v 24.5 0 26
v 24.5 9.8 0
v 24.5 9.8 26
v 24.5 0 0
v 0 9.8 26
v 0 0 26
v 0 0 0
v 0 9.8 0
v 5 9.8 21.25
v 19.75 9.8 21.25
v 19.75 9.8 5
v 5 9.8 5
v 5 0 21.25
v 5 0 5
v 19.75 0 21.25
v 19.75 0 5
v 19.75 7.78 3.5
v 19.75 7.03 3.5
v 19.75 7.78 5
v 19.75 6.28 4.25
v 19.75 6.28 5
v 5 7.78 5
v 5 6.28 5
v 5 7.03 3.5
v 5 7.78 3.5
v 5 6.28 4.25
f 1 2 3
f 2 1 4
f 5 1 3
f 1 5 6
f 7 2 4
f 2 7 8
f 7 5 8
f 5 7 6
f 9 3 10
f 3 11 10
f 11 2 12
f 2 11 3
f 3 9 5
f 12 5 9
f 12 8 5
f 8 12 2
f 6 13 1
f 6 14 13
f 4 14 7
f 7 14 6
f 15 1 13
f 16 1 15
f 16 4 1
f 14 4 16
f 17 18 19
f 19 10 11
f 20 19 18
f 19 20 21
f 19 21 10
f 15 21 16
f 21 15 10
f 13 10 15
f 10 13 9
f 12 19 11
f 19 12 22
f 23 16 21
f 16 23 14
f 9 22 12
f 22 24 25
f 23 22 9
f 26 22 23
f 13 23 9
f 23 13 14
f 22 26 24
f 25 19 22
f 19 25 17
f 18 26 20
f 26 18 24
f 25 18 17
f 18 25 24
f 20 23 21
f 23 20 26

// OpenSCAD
// all dimensions are in millimeters

// major dimension for keystone hole, width
keystone_width = 14.5;
// major dimension for keystone hole, height
keystone_height = 16;

// clearance around hole
boss_clearance = 0.25;
// margin aroudn keystone hole
boss_margin = 5;
boss_inner_width = keystone_width + boss_clearance;
boss_inner_height = keystone_height + boss_clearance;
boss_outer_width = keystone_width + boss_margin * 2;
boss_outer_height = keystone_height + boss_margin * 2;
// depth of the solid frame around the keystone hole
boss_depth = 9.8;

// major dimension of fixed tab as viewed from side of connector (square with a corner cut off)
fixed_tab_size = 1.5;
fixed_tab_depth_from_panel_face = 6.28;

module boss() {
    module basic_frame() {
        color([1, 1, 1])
            difference() {
                cube([boss_outer_width, boss_depth, boss_outer_height]);
                translate([boss_margin, 0, boss_margin])
                    cube([boss_inner_width, boss_depth, boss_inner_height]);
            }
    }

    module clearance_for_fixed_tab() {
        translate([boss_margin, fixed_tab_depth_from_panel_face, boss_margin])
        rotate([0, 90, 0])
        linear_extrude(height=boss_inner_width)
        // polygon drawn as viewed from side of keystone connector (triangular-ish face)
        polygon(points=[[0, 0], [0, fixed_tab_size], [fixed_tab_size, fixed_tab_size], [fixed_tab_size, fixed_tab_size / 2], [fixed_tab_size / 2, 0]]);
    }

    module clearances() {
        clearance_for_fixed_tab();
    }

    difference() {
        basic_frame();
        clearances();
    }
}

module keystone() {
    boss();
}

keystone();
